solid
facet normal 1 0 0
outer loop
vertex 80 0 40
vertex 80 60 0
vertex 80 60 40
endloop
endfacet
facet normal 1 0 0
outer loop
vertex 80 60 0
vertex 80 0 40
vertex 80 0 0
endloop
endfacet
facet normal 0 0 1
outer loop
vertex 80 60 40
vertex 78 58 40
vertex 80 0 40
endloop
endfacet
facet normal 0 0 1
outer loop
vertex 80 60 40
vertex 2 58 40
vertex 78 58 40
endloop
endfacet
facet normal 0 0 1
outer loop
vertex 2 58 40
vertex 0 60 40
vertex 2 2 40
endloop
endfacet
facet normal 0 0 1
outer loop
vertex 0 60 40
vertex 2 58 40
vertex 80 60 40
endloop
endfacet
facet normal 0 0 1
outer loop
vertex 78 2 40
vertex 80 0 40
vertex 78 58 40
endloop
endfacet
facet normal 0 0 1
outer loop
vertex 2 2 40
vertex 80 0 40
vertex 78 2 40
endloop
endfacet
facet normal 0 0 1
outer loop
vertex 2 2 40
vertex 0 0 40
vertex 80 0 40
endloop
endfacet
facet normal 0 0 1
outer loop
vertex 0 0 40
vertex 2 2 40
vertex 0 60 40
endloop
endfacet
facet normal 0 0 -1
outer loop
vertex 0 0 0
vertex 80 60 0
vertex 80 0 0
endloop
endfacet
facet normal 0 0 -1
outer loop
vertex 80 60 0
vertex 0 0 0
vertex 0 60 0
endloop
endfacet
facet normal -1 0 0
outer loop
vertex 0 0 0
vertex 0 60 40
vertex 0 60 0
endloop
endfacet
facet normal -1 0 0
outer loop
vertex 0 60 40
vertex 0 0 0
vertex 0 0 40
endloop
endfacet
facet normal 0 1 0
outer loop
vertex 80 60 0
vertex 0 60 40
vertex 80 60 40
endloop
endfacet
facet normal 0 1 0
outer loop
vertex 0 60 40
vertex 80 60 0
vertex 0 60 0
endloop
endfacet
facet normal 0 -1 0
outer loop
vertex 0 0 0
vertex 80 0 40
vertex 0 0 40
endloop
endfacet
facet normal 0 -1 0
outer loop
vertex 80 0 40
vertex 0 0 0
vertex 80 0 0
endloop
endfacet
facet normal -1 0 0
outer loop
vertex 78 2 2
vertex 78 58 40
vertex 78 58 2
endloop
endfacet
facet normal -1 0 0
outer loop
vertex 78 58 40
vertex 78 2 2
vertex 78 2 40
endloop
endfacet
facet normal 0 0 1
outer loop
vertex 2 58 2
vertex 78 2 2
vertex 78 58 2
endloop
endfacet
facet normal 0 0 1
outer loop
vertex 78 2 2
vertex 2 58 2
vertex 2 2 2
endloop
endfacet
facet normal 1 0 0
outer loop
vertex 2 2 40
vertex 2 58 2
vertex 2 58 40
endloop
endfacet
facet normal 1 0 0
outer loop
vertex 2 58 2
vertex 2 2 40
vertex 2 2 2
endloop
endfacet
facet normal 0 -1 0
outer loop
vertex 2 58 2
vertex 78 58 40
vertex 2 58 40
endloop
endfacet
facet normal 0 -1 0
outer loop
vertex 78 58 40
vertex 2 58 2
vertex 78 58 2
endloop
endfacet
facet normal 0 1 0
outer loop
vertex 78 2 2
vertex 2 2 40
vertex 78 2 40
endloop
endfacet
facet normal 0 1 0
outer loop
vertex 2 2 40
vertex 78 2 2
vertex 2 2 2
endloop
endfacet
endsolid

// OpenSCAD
// Parametric Box Template
// Usage: Set parameters and render

$fn = 32;

// Parameters (will be replaced by generator)
width = 80;    // mm
depth = 60;    // mm
height = 40;   // mm
wall = 2;      // mm
has_lid = false;

// Main box
module box() {
    difference() {
        // Outer shell
        cube([width, depth, height]);
        
        // Inner cavity
        translate([wall, wall, wall])
            cube([width - 2*wall, depth - 2*wall, height]);
    }
}

// Lid module
module lid() {
    lid_height = wall * 2;
    lip = wall * 0.8;
    
    translate([0, 0, height + 2]) {
        // Lid top
        cube([width, depth, wall]);
        
        // Lip that fits inside
        translate([wall + 0.2, wall + 0.2, -lip])
            cube([width - 2*wall - 0.4, depth - 2*wall - 0.4, lip]);
    }
}

// Render
box();
if (has_lid) lid();
